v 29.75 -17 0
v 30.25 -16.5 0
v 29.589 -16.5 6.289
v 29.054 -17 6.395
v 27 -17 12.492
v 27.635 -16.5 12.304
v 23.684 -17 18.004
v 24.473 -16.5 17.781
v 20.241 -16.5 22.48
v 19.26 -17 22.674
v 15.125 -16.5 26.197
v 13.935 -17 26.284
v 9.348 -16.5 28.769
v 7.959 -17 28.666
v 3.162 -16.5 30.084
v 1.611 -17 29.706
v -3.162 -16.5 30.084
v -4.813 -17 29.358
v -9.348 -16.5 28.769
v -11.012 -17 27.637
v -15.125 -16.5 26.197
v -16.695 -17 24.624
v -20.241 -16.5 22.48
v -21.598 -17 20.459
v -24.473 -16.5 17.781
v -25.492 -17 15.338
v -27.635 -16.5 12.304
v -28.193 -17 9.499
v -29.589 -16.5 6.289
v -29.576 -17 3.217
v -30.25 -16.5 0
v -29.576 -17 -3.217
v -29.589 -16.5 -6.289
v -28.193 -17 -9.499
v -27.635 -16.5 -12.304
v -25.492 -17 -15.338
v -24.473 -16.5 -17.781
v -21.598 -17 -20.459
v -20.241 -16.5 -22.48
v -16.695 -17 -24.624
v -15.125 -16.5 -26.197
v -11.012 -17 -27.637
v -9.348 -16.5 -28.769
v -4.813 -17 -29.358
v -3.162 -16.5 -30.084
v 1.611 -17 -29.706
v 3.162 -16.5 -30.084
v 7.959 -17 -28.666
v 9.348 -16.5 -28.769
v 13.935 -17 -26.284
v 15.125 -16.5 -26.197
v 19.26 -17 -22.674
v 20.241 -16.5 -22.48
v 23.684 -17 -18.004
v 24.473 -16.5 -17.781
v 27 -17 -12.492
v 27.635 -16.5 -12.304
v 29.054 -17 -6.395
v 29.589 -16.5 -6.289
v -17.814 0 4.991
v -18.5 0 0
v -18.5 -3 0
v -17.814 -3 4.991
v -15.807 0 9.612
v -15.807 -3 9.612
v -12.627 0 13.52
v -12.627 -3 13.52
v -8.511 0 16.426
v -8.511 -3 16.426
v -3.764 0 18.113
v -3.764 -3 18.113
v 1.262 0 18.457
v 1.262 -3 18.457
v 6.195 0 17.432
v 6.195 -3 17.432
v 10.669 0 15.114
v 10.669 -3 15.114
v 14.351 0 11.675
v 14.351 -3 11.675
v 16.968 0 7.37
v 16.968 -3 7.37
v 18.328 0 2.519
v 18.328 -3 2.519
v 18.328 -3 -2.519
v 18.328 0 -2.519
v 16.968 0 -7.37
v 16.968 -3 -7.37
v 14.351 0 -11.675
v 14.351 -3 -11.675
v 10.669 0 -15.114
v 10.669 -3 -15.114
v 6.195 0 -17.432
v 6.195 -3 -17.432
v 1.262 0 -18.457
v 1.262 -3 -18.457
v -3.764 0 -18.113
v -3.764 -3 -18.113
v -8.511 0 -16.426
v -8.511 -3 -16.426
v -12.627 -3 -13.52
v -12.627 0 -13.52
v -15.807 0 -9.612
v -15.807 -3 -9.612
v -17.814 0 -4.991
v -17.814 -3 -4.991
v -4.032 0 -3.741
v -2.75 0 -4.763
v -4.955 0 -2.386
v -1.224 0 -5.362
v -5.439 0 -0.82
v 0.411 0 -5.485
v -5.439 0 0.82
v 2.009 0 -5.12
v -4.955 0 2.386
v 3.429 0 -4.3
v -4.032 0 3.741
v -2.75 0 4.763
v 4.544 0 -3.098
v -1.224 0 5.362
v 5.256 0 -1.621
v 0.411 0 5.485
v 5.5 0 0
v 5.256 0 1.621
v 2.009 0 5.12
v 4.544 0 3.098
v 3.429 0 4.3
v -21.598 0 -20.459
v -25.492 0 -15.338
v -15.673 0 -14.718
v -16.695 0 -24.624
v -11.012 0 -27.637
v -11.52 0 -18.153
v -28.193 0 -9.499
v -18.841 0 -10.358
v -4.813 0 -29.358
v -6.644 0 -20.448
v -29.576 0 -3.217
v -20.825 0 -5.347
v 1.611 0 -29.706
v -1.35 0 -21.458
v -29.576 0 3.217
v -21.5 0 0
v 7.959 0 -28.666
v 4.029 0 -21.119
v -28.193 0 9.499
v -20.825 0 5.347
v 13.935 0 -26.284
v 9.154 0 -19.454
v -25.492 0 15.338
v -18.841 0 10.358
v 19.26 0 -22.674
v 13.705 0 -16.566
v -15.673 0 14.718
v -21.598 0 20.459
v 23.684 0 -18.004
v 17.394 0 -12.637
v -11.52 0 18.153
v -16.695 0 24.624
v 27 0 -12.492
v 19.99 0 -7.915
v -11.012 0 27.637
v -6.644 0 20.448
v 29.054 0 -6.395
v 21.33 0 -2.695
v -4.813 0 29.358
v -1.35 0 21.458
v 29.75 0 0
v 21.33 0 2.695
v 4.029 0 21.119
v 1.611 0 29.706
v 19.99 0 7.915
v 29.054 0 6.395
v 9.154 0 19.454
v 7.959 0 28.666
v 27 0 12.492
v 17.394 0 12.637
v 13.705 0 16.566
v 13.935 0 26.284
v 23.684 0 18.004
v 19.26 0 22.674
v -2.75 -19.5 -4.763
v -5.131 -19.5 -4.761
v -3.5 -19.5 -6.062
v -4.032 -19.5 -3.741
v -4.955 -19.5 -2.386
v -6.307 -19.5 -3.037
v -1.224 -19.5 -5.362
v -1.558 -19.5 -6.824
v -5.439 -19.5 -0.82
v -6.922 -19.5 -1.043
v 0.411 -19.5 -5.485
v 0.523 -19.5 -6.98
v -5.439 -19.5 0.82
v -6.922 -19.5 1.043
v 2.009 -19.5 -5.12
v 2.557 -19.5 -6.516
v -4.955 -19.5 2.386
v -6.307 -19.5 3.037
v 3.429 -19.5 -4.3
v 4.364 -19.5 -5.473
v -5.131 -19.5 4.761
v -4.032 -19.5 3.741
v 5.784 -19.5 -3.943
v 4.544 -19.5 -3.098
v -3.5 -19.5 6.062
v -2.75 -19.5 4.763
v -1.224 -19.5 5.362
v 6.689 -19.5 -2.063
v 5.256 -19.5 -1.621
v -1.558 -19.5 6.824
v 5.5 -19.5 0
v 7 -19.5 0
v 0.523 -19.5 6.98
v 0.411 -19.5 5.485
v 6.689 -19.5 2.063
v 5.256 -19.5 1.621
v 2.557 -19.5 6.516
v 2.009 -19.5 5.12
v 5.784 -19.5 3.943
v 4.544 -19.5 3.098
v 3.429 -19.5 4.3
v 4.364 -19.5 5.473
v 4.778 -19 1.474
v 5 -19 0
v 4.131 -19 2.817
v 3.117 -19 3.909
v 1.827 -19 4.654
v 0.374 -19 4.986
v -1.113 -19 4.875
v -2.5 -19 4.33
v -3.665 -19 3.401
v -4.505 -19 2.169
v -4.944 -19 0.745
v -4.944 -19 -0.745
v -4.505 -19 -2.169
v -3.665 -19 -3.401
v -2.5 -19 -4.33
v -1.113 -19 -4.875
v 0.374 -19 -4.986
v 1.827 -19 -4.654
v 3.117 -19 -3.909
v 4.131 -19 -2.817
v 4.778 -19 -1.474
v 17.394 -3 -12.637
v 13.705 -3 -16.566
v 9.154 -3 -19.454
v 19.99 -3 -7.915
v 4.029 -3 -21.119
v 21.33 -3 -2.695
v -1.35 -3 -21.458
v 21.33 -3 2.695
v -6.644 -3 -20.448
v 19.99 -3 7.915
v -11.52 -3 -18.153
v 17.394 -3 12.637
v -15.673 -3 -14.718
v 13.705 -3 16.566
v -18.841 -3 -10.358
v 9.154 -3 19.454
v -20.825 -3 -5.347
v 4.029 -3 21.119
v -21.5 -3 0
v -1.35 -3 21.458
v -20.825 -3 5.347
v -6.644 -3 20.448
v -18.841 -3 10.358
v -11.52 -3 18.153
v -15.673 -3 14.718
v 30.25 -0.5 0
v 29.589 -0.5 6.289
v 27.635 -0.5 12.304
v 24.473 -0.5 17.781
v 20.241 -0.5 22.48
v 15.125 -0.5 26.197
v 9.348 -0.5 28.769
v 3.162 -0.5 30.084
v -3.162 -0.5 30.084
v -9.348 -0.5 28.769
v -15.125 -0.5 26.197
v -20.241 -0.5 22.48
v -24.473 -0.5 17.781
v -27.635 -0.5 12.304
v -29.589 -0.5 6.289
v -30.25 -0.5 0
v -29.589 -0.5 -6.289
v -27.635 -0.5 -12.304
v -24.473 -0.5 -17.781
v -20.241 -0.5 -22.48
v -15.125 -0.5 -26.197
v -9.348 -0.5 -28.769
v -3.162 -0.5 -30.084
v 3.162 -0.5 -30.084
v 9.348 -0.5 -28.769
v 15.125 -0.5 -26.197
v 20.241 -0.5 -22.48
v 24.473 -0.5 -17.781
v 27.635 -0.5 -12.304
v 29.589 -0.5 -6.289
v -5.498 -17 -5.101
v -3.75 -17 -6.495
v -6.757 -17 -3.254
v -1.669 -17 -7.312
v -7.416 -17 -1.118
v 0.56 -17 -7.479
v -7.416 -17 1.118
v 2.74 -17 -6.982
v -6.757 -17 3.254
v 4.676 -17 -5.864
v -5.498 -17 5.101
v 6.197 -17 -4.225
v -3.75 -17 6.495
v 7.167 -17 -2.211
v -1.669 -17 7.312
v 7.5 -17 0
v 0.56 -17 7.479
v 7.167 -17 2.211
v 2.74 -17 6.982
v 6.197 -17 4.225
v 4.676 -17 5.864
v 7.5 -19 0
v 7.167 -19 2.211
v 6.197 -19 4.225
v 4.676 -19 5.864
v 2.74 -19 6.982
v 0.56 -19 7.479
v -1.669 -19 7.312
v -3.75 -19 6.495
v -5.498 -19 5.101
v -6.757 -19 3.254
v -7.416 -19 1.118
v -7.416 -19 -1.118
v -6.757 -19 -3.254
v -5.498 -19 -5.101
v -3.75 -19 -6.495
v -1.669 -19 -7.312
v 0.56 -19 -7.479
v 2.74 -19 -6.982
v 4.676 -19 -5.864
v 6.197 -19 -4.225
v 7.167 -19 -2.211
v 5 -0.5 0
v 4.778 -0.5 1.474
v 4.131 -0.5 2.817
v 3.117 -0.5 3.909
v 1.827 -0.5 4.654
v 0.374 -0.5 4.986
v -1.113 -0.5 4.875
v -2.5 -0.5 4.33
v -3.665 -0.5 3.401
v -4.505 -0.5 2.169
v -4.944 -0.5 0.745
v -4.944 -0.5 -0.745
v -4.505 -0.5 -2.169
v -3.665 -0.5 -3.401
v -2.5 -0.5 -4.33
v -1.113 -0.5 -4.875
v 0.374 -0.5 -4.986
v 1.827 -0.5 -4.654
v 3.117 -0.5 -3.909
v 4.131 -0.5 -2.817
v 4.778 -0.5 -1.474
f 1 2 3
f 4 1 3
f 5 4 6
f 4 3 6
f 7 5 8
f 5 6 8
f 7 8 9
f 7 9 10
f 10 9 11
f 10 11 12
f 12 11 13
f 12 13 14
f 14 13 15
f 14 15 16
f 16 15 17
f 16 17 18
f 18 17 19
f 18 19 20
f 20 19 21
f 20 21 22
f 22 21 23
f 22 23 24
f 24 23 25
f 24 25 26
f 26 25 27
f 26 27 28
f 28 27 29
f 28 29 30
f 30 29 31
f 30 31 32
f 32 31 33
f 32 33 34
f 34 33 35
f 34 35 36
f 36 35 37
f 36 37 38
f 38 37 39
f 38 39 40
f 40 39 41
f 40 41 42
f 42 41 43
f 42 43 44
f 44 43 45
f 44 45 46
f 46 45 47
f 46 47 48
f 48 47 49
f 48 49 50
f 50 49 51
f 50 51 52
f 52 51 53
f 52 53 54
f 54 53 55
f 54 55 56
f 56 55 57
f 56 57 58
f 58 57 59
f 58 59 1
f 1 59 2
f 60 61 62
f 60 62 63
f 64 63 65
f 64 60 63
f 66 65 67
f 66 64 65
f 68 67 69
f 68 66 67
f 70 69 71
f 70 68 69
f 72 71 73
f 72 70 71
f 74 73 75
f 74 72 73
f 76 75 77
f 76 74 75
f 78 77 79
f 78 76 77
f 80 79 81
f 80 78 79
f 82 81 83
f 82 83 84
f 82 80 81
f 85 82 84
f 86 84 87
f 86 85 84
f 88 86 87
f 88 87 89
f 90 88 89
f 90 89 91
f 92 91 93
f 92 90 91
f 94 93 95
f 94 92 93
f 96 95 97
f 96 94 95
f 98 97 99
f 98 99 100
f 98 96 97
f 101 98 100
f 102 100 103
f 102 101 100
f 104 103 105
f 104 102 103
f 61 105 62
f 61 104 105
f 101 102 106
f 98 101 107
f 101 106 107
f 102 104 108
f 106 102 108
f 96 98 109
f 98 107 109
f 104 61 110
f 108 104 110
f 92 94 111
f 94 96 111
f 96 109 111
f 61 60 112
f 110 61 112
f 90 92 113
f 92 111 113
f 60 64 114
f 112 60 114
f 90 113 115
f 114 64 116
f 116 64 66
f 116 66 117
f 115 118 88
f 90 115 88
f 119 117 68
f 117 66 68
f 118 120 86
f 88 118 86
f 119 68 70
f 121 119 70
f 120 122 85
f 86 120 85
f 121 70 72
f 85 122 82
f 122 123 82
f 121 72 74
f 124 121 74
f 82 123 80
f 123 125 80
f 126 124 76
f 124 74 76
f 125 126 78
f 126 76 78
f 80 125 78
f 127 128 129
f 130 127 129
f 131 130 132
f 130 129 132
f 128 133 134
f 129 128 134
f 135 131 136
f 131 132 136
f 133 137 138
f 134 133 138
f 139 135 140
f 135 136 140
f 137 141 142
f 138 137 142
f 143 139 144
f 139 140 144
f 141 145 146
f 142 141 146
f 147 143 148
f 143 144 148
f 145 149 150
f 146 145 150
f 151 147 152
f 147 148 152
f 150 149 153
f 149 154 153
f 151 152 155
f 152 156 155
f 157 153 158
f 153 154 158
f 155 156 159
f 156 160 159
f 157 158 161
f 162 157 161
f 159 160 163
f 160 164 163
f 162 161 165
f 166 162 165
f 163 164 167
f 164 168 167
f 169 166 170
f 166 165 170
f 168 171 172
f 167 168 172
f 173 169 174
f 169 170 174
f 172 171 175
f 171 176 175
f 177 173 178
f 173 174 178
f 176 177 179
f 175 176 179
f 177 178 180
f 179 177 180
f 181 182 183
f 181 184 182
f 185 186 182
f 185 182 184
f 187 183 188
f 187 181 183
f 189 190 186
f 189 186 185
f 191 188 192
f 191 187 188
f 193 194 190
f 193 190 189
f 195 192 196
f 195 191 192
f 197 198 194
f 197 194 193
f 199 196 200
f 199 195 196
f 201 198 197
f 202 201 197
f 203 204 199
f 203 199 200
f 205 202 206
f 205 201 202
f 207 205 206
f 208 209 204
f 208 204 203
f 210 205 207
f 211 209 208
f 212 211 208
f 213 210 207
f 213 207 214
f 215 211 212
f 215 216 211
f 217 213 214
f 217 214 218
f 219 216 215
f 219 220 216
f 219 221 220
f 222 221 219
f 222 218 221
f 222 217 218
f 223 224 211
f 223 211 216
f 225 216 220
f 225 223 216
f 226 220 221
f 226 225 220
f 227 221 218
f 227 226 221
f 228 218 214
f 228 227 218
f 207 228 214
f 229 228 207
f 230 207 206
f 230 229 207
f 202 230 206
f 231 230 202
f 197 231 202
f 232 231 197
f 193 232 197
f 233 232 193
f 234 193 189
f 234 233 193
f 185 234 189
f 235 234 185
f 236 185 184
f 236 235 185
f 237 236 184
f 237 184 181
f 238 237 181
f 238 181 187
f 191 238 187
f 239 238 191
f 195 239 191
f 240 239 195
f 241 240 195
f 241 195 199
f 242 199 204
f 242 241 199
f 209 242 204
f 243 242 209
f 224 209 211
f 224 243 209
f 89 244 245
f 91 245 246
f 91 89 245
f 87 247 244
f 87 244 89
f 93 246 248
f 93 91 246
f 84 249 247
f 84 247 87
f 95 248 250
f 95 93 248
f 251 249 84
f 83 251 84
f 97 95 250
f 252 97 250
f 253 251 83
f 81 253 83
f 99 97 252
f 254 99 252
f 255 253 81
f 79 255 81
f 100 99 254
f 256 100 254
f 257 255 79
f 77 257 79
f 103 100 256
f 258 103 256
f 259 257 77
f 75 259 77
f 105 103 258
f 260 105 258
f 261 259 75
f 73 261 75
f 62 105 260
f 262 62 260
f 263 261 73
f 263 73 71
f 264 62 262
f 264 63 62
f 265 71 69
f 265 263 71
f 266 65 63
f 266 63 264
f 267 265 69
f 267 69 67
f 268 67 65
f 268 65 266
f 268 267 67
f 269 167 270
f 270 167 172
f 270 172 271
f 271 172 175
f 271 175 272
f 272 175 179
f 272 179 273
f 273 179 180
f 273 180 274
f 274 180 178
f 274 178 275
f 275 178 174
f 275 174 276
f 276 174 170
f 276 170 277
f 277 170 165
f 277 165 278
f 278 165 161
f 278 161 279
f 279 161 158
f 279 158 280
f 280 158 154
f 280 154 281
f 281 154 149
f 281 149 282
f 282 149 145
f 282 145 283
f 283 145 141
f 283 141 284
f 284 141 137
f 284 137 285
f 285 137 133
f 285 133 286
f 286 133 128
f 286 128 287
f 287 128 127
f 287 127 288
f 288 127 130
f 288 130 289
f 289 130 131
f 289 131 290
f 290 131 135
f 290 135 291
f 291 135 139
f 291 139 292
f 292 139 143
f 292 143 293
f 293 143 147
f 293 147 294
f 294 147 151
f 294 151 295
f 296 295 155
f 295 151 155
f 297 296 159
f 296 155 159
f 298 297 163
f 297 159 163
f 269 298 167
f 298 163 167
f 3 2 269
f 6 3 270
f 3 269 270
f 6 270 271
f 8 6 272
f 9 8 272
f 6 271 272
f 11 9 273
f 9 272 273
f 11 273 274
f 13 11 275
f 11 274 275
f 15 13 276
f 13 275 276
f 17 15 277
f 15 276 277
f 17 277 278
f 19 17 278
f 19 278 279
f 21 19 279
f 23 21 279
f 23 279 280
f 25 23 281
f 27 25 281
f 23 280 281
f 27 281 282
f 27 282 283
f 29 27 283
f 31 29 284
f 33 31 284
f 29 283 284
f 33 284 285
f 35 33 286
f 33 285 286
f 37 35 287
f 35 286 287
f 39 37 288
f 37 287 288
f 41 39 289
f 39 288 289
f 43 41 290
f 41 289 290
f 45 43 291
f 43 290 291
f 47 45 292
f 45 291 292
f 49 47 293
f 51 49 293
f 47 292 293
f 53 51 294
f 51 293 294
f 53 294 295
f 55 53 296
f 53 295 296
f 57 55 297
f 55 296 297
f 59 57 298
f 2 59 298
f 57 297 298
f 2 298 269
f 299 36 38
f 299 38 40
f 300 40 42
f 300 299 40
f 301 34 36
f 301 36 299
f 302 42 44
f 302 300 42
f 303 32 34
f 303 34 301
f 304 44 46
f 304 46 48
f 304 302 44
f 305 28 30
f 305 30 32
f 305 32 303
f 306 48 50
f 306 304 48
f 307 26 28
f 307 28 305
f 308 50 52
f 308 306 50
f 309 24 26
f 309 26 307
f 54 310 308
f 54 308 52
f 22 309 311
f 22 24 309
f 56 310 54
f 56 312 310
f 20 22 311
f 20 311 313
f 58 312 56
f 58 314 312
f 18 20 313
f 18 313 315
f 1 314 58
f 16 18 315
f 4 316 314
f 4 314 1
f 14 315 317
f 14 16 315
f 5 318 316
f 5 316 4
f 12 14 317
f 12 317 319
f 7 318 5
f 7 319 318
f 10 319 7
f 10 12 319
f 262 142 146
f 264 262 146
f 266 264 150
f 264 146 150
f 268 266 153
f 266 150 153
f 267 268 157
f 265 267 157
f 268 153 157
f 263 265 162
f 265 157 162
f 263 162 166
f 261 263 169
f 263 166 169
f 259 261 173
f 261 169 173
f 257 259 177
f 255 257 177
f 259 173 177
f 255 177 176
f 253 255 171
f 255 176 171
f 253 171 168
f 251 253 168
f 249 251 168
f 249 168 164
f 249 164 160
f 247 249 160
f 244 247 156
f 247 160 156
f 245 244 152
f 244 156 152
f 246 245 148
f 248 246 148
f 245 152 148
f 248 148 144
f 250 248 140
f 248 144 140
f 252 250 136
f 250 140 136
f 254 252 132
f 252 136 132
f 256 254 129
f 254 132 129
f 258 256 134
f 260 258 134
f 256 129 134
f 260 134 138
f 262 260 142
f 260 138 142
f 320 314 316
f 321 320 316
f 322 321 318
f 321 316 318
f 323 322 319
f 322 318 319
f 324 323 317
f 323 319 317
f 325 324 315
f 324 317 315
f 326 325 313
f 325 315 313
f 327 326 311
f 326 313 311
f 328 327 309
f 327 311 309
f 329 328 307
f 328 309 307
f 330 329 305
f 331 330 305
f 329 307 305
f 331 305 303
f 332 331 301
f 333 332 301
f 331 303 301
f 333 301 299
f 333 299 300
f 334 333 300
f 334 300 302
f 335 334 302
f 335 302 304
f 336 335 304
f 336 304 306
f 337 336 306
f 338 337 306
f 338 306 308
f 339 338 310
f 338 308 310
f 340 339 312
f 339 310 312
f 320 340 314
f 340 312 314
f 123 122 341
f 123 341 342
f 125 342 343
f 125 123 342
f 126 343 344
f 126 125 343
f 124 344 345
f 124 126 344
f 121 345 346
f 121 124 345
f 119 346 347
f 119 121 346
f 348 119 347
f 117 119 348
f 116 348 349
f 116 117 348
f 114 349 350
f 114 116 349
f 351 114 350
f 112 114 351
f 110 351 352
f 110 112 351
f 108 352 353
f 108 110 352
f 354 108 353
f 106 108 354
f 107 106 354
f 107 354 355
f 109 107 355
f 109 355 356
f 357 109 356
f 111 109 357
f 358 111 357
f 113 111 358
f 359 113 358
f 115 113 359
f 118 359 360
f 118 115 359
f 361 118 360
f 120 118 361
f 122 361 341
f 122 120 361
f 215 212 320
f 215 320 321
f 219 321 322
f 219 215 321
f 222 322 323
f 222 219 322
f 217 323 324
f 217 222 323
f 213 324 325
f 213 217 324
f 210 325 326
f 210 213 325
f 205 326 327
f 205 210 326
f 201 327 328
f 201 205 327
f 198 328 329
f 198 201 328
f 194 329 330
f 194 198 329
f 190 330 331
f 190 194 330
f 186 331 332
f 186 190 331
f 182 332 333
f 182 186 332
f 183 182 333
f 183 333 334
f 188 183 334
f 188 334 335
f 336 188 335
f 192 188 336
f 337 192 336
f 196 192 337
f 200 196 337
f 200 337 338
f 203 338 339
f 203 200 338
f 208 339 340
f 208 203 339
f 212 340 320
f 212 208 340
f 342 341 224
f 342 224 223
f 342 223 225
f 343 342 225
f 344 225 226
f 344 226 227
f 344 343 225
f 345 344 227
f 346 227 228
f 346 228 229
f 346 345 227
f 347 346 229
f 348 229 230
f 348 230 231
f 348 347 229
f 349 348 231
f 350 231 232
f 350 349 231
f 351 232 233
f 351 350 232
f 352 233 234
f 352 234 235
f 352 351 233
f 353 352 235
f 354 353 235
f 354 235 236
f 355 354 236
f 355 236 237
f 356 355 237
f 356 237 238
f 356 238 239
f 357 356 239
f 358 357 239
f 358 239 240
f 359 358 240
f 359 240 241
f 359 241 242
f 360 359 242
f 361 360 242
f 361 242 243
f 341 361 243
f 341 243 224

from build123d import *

# Parameters (mm, degrees)
F0_R     = 30.25
F0_R_2   = 5
F1_DEPTH = 17
F2_R     = 7.5
F2_R_2   = 5
F3_DEPTH = 2.5
F4_R     = 21.5
F4_R_2   = 18.5
F5_DEPTH = 3
F6_SIZE  = 0.5


with BuildPart() as f1:
    # F0 (on Front) → F1 (new body)
    with BuildSketch(Plane.XZ):
        Circle(F0_R)
        Circle(F0_R_2, mode=Mode.SUBTRACT)
    extrude(amount=F1_DEPTH)

    # F2 (on face) → F3 (join)
    with BuildSketch(Plane.XZ.offset(17)):
        Circle(F2_R)
        Circle(F2_R_2, mode=Mode.SUBTRACT)
    extrude(amount=F3_DEPTH)

    # F4 (on face) → F5 (cut)
    with BuildSketch(Plane(origin=(0, 0, 0), x_dir=(-1, 0, 0), z_dir=(0, 1, 0))):
        Circle(F4_R)
        Circle(F4_R_2, mode=Mode.SUBTRACT)
    extrude(amount=-F5_DEPTH, mode=Mode.SUBTRACT)

    # F6
    f6_edges = [f1.edges().sort_by_distance(p)[0] for p in [
        (-30.25, -17, 0),
        (-7.5, -19.5, 0),
        (-5, -19.5, 0),
        (-30.25, 0, 0),
        (-5, 0, 0),
    ]]
    chamfer(f6_edges, length=F6_SIZE)


solid = f1.part
